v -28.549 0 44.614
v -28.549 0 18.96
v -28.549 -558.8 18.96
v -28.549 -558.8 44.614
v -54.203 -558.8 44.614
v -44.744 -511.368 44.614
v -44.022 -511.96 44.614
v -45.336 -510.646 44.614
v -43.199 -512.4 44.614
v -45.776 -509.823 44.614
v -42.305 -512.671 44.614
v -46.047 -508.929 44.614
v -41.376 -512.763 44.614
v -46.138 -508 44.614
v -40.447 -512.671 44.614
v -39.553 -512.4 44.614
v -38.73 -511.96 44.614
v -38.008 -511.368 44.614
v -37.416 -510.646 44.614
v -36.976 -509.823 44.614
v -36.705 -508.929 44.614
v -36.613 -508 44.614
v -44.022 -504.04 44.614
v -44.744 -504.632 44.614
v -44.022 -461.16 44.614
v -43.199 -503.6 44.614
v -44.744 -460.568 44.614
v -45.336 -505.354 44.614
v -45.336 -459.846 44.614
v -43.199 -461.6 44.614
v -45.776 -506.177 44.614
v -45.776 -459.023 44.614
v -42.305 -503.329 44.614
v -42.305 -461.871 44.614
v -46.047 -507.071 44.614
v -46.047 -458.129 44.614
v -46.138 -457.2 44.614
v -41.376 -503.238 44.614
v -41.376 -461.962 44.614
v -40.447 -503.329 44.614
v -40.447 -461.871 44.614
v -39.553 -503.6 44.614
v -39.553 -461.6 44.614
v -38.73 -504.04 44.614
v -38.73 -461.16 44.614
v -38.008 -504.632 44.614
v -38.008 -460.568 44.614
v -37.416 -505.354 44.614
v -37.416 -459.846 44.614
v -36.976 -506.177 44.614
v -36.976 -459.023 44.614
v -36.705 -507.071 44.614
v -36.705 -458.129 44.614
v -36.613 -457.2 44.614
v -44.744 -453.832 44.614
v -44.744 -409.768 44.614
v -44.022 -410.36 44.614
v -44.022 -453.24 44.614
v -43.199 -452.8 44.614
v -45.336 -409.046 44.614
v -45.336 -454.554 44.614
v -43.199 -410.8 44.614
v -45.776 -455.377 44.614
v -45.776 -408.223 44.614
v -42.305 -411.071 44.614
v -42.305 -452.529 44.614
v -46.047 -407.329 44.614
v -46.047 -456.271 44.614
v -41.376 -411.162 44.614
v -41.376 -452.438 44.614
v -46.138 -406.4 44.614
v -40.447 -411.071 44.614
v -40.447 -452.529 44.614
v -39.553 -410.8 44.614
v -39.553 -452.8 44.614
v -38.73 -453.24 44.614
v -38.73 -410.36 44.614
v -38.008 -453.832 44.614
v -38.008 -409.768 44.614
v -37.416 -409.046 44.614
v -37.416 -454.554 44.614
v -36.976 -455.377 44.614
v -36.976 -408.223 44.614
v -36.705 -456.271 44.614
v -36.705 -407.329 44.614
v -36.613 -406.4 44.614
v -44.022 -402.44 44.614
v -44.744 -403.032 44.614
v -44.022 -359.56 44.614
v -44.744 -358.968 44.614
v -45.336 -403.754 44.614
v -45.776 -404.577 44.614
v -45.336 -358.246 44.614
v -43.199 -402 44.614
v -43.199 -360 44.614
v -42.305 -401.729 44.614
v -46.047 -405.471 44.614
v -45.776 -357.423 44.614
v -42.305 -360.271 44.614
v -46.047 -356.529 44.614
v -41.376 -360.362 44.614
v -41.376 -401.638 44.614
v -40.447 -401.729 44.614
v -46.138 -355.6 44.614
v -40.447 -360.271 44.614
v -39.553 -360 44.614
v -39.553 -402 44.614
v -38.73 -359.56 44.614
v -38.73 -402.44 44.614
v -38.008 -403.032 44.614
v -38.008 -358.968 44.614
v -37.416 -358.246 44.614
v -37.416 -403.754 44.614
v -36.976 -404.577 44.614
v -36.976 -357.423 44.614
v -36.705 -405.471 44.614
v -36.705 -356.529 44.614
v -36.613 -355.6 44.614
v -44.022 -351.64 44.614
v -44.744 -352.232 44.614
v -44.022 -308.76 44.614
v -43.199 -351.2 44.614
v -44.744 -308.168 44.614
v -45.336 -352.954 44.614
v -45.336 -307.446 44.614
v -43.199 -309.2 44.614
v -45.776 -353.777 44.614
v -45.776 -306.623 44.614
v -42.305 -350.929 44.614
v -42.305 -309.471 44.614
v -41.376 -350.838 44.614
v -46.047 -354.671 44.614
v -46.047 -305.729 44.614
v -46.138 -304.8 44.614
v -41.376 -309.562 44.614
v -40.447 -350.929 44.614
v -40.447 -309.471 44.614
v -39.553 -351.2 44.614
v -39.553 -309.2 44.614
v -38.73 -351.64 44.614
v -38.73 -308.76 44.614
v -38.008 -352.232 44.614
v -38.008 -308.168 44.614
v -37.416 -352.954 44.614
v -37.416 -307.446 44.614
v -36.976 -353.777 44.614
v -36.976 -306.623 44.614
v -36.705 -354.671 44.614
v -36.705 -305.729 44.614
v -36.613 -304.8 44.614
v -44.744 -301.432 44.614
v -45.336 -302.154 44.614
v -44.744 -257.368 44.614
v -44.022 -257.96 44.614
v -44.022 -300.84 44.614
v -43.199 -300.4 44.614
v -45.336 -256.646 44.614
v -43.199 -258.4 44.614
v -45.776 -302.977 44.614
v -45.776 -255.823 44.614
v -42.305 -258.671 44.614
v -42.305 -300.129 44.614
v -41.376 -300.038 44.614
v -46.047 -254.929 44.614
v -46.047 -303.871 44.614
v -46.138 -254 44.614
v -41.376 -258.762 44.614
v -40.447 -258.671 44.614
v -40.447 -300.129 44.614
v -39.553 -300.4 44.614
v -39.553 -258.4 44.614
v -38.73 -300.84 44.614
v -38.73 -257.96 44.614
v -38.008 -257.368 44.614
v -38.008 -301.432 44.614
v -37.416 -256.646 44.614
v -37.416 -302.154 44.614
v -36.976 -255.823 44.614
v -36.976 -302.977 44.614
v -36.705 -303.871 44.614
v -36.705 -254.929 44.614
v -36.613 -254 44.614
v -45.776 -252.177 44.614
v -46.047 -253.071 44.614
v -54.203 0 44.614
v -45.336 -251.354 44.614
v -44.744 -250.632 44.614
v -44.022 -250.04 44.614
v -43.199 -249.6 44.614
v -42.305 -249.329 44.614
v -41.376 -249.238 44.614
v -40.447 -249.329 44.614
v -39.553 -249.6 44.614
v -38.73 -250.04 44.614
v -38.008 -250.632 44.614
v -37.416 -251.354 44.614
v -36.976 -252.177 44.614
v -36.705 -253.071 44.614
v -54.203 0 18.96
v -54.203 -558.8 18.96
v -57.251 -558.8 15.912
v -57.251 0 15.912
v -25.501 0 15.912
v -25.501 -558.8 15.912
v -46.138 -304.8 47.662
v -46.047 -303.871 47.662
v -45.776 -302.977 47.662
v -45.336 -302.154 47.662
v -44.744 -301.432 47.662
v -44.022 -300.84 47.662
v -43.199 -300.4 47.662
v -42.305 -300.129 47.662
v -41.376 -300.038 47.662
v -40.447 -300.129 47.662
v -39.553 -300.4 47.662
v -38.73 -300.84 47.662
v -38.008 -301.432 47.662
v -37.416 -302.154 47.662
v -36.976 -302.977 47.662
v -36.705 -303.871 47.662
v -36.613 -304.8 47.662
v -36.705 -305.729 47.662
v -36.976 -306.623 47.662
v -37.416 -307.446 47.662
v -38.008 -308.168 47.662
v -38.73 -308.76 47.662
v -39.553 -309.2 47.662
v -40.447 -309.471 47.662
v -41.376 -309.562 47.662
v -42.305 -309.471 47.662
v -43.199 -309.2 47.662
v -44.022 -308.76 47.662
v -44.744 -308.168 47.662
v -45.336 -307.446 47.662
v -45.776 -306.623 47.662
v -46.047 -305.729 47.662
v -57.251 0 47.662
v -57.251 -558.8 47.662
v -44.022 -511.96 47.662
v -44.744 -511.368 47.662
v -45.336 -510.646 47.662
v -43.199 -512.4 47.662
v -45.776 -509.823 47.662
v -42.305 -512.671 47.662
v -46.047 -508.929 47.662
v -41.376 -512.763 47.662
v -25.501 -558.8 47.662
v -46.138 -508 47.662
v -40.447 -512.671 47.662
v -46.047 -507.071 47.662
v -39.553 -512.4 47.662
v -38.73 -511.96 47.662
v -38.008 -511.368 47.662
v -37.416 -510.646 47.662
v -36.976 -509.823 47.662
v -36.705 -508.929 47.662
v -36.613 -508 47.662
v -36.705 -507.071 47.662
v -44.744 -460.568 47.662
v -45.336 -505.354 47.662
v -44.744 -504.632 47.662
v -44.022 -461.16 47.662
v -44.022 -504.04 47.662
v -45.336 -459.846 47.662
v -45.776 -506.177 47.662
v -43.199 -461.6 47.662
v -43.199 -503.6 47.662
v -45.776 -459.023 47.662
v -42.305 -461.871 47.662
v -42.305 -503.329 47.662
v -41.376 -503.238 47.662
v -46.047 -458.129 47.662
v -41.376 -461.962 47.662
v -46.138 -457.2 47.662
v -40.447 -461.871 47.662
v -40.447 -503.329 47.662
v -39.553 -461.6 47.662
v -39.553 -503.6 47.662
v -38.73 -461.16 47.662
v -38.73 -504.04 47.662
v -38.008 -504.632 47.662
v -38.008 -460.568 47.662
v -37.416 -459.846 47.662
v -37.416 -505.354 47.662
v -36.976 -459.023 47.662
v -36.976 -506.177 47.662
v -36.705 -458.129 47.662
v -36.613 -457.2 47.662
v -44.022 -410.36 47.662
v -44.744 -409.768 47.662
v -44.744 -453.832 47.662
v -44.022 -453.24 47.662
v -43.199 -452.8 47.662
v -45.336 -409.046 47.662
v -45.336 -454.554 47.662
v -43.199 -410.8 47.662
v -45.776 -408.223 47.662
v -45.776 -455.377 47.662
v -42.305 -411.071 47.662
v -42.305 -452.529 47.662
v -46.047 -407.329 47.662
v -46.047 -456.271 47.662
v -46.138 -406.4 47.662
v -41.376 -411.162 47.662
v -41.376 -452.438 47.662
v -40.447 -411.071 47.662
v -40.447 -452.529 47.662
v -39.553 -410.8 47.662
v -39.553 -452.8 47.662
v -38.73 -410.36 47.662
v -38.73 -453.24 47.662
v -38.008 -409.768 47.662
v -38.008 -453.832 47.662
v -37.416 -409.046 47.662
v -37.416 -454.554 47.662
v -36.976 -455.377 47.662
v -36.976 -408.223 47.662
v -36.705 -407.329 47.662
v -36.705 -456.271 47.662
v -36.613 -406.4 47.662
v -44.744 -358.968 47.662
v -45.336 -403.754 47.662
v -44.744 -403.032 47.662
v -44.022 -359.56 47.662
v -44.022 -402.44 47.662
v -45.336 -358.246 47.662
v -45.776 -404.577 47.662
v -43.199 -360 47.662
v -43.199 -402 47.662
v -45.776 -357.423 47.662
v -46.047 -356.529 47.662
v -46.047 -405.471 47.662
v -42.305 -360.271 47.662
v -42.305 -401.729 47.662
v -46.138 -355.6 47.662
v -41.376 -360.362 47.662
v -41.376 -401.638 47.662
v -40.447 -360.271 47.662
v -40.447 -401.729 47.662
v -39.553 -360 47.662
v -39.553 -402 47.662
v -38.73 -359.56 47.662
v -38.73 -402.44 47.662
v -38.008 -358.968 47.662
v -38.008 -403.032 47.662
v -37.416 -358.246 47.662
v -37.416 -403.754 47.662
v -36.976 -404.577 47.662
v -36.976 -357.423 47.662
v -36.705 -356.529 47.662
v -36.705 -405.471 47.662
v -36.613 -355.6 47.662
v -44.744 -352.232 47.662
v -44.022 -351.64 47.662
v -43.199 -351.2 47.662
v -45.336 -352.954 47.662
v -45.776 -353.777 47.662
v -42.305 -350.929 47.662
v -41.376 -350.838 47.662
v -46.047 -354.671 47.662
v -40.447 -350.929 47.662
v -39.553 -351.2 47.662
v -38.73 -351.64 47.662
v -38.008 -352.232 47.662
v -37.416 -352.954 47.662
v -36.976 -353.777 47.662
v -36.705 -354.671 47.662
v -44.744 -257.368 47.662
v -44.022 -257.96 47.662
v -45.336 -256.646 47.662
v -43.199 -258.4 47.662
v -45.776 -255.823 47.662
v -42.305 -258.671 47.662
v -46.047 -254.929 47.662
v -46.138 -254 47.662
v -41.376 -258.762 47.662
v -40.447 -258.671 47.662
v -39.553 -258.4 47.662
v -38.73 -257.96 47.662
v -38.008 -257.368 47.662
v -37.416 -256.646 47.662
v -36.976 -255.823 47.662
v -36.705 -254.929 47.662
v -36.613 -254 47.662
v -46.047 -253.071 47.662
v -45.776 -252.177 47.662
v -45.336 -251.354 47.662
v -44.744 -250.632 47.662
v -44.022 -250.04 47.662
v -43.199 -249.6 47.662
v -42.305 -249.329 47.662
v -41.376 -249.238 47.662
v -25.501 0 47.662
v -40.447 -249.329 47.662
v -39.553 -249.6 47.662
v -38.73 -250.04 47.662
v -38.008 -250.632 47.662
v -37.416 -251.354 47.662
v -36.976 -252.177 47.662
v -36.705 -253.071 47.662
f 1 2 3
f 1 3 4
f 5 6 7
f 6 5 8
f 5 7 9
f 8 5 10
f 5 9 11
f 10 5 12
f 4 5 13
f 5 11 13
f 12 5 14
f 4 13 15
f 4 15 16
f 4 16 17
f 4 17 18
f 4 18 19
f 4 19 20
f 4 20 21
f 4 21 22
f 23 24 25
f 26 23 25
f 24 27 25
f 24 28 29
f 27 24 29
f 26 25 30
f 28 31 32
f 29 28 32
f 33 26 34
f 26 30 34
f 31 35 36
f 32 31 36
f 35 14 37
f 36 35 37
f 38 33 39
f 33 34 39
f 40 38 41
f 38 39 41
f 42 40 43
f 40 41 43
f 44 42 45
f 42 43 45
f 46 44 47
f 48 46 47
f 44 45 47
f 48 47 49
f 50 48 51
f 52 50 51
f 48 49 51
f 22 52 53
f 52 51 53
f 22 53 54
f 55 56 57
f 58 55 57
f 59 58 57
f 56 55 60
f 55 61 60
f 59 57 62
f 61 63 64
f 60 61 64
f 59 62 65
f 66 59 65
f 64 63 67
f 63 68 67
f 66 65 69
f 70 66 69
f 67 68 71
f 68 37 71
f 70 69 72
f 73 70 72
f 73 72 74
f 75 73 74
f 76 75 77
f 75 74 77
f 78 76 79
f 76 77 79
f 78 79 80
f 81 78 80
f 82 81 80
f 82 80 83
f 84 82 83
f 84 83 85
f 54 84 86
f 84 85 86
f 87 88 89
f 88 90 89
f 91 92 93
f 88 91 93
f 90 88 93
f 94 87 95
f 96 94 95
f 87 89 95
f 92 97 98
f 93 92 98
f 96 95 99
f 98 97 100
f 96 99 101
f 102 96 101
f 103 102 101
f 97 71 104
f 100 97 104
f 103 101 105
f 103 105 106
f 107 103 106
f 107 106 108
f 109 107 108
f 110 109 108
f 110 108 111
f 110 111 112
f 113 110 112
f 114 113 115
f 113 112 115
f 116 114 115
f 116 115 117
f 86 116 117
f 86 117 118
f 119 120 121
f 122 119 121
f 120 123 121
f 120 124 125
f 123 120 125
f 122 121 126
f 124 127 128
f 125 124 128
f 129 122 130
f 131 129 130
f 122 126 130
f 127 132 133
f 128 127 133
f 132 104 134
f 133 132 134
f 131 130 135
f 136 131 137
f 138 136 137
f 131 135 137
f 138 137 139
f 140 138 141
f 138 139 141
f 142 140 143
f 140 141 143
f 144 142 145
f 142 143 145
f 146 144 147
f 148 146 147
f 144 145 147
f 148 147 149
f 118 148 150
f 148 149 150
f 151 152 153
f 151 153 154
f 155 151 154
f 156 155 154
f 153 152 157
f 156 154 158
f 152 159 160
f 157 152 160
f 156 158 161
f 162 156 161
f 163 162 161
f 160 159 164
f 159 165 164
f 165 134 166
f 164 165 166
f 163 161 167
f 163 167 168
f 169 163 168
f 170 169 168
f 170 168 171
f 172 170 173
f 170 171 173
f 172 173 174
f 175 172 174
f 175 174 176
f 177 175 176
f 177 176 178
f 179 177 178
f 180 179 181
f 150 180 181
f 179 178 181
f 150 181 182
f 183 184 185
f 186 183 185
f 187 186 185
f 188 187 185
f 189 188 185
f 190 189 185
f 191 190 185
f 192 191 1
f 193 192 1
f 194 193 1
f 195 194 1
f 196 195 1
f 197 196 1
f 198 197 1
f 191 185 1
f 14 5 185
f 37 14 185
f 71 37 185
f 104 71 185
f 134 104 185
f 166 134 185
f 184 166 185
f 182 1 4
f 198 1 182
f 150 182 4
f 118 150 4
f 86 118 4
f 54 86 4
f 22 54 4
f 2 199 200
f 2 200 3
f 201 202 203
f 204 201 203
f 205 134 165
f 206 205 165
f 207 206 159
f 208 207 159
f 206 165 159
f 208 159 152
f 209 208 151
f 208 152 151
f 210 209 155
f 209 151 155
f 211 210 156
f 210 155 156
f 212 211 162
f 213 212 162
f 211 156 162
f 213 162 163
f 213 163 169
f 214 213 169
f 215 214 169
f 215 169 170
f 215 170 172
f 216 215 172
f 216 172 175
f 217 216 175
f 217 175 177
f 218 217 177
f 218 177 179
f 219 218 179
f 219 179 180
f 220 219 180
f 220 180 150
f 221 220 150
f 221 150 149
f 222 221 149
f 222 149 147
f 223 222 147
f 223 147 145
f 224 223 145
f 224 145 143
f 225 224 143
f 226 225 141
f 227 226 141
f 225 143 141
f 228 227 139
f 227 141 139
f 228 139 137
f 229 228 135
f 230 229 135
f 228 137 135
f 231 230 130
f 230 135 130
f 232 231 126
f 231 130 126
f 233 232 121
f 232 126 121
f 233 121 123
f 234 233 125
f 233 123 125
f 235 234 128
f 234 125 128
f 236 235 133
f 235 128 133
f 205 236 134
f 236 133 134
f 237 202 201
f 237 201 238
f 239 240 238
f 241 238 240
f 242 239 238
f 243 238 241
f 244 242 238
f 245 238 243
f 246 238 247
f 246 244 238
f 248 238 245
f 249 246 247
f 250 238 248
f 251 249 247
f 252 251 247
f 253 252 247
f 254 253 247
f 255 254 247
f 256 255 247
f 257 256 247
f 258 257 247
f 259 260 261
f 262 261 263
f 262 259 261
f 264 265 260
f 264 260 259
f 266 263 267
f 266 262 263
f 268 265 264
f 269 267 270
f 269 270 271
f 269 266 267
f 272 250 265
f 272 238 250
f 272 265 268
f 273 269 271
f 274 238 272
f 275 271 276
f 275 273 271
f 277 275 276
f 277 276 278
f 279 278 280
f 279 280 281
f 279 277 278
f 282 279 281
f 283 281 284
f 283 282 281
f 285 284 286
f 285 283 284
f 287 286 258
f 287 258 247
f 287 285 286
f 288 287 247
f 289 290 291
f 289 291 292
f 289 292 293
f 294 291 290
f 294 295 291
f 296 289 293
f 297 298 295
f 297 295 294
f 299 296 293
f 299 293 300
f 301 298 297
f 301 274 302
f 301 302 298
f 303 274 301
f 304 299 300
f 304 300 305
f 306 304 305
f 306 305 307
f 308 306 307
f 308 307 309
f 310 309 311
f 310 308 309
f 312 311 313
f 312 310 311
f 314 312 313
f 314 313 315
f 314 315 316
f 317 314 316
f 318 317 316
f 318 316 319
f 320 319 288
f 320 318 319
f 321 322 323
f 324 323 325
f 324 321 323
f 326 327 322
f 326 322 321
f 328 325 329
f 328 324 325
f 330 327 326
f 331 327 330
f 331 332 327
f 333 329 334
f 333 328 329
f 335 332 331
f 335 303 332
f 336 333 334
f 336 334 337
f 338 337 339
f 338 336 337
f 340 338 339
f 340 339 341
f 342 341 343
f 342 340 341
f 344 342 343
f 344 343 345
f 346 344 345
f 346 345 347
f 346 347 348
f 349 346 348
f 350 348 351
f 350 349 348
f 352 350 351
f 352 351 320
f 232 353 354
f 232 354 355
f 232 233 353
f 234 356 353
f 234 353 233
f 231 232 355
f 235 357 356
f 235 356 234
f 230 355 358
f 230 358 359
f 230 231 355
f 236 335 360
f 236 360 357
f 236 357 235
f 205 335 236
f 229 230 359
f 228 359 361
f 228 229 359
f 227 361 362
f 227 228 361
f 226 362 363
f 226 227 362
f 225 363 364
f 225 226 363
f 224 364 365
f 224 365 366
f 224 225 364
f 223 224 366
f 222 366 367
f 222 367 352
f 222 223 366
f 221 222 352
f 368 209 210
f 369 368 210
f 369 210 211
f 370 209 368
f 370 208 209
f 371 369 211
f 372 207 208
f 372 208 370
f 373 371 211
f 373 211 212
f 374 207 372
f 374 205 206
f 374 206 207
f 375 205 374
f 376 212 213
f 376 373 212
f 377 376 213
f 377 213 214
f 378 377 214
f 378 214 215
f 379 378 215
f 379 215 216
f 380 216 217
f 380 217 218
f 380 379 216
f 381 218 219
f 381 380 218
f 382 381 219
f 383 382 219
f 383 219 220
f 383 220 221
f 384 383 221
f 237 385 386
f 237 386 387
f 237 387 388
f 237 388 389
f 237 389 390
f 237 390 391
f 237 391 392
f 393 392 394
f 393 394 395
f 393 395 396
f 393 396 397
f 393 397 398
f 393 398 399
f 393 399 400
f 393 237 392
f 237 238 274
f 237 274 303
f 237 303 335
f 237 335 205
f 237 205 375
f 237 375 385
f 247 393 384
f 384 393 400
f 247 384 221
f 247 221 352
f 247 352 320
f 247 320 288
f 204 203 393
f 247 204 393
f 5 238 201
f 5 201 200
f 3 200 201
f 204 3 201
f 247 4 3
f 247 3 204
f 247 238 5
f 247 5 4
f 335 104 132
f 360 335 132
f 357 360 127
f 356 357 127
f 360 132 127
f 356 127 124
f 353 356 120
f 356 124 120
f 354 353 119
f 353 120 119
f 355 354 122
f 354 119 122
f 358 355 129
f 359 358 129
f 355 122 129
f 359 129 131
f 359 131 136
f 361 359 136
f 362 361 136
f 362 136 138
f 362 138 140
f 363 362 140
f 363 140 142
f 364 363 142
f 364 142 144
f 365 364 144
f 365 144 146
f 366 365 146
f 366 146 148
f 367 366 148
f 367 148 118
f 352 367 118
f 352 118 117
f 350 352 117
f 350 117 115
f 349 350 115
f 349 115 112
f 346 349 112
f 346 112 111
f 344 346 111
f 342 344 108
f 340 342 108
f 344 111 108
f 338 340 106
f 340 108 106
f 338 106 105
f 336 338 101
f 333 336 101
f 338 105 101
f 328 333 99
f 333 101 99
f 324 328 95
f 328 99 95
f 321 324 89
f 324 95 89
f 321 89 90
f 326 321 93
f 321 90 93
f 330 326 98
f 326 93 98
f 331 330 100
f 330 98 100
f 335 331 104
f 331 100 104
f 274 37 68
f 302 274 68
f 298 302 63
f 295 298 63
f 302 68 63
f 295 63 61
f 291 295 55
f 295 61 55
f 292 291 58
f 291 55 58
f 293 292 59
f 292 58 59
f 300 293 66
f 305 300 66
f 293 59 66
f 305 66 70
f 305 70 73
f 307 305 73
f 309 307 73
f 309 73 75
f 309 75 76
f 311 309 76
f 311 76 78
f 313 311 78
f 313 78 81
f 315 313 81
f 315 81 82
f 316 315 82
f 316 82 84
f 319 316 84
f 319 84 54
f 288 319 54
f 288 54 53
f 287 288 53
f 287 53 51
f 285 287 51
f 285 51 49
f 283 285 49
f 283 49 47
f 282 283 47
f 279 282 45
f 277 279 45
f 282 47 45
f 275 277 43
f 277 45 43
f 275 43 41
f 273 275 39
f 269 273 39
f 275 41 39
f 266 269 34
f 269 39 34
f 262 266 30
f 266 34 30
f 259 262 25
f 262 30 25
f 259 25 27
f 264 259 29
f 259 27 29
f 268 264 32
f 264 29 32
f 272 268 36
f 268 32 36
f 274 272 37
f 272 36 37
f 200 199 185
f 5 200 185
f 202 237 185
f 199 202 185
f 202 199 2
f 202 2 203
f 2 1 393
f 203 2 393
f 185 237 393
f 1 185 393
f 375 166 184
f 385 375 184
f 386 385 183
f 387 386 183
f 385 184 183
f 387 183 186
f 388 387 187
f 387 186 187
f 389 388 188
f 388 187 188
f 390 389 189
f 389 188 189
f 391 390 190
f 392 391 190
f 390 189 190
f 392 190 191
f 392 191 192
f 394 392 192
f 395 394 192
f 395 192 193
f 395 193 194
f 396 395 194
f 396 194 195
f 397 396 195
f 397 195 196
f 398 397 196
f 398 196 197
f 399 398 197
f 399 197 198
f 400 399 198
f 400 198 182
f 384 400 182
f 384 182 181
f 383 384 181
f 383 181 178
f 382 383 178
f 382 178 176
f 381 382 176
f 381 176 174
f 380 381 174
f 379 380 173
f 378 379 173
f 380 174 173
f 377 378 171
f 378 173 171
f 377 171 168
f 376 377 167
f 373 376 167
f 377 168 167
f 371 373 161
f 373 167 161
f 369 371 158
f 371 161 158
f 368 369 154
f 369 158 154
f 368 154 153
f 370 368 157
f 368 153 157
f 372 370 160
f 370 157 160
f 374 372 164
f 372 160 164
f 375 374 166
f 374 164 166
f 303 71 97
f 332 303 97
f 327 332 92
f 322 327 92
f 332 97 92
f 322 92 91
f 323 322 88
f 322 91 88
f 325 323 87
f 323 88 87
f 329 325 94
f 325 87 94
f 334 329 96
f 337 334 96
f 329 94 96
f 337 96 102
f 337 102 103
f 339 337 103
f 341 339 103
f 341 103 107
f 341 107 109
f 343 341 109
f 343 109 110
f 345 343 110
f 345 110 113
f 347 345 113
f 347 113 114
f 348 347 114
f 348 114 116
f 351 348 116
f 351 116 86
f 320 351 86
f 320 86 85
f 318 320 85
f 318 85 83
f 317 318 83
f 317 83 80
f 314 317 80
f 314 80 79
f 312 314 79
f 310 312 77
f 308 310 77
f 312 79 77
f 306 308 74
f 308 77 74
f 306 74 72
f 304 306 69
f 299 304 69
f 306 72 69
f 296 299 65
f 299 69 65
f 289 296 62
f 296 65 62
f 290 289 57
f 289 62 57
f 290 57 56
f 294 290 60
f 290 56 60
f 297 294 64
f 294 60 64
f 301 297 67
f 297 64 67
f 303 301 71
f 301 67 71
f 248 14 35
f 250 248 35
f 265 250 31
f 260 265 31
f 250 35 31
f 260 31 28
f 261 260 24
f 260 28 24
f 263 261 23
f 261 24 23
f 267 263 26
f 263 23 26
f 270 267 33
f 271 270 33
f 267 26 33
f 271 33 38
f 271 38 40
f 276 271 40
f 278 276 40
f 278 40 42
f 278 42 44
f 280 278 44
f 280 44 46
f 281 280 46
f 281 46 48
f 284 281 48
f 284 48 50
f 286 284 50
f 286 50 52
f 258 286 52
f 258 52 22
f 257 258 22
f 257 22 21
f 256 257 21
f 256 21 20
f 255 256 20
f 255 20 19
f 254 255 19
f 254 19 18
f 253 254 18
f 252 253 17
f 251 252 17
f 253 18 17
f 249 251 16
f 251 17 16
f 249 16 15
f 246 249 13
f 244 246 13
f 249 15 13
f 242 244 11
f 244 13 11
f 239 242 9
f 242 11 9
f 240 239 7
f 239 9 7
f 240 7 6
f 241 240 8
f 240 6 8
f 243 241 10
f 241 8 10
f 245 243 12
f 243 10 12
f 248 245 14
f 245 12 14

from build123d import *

# Parameters (mm, degrees)
F0_W     = 31.75
F0_H     = 31.75
F0_W_2   = 25.654
F0_H_2   = 25.654
F1_DEPTH = 558.8
F3_D     = 9.525
F3_DEPTH = 12.7


with BuildPart() as f1:
    # F0 (on Front) → F1 (new body)
    with BuildSketch(Plane.XZ):
        with Locations((-41.375973, 31.78728)):
            Rectangle(F0_W, F0_H)
        with Locations((-41.375973, 31.78728)):
            Rectangle(F0_W_2, F0_H_2, mode=Mode.SUBTRACT)
    extrude(amount=F1_DEPTH)

    # F3
    with Locations(Plane.XY.offset(47.66228)):
        with Locations((-41.375973, -508), (-41.375973, -457.2), (-41.375973, -406.4), (-41.375973, -355.6), (-41.375973, -304.8), (-41.375973, -254)):
            Hole(F3_D / 2, depth=F3_DEPTH)


solid = f1.part
